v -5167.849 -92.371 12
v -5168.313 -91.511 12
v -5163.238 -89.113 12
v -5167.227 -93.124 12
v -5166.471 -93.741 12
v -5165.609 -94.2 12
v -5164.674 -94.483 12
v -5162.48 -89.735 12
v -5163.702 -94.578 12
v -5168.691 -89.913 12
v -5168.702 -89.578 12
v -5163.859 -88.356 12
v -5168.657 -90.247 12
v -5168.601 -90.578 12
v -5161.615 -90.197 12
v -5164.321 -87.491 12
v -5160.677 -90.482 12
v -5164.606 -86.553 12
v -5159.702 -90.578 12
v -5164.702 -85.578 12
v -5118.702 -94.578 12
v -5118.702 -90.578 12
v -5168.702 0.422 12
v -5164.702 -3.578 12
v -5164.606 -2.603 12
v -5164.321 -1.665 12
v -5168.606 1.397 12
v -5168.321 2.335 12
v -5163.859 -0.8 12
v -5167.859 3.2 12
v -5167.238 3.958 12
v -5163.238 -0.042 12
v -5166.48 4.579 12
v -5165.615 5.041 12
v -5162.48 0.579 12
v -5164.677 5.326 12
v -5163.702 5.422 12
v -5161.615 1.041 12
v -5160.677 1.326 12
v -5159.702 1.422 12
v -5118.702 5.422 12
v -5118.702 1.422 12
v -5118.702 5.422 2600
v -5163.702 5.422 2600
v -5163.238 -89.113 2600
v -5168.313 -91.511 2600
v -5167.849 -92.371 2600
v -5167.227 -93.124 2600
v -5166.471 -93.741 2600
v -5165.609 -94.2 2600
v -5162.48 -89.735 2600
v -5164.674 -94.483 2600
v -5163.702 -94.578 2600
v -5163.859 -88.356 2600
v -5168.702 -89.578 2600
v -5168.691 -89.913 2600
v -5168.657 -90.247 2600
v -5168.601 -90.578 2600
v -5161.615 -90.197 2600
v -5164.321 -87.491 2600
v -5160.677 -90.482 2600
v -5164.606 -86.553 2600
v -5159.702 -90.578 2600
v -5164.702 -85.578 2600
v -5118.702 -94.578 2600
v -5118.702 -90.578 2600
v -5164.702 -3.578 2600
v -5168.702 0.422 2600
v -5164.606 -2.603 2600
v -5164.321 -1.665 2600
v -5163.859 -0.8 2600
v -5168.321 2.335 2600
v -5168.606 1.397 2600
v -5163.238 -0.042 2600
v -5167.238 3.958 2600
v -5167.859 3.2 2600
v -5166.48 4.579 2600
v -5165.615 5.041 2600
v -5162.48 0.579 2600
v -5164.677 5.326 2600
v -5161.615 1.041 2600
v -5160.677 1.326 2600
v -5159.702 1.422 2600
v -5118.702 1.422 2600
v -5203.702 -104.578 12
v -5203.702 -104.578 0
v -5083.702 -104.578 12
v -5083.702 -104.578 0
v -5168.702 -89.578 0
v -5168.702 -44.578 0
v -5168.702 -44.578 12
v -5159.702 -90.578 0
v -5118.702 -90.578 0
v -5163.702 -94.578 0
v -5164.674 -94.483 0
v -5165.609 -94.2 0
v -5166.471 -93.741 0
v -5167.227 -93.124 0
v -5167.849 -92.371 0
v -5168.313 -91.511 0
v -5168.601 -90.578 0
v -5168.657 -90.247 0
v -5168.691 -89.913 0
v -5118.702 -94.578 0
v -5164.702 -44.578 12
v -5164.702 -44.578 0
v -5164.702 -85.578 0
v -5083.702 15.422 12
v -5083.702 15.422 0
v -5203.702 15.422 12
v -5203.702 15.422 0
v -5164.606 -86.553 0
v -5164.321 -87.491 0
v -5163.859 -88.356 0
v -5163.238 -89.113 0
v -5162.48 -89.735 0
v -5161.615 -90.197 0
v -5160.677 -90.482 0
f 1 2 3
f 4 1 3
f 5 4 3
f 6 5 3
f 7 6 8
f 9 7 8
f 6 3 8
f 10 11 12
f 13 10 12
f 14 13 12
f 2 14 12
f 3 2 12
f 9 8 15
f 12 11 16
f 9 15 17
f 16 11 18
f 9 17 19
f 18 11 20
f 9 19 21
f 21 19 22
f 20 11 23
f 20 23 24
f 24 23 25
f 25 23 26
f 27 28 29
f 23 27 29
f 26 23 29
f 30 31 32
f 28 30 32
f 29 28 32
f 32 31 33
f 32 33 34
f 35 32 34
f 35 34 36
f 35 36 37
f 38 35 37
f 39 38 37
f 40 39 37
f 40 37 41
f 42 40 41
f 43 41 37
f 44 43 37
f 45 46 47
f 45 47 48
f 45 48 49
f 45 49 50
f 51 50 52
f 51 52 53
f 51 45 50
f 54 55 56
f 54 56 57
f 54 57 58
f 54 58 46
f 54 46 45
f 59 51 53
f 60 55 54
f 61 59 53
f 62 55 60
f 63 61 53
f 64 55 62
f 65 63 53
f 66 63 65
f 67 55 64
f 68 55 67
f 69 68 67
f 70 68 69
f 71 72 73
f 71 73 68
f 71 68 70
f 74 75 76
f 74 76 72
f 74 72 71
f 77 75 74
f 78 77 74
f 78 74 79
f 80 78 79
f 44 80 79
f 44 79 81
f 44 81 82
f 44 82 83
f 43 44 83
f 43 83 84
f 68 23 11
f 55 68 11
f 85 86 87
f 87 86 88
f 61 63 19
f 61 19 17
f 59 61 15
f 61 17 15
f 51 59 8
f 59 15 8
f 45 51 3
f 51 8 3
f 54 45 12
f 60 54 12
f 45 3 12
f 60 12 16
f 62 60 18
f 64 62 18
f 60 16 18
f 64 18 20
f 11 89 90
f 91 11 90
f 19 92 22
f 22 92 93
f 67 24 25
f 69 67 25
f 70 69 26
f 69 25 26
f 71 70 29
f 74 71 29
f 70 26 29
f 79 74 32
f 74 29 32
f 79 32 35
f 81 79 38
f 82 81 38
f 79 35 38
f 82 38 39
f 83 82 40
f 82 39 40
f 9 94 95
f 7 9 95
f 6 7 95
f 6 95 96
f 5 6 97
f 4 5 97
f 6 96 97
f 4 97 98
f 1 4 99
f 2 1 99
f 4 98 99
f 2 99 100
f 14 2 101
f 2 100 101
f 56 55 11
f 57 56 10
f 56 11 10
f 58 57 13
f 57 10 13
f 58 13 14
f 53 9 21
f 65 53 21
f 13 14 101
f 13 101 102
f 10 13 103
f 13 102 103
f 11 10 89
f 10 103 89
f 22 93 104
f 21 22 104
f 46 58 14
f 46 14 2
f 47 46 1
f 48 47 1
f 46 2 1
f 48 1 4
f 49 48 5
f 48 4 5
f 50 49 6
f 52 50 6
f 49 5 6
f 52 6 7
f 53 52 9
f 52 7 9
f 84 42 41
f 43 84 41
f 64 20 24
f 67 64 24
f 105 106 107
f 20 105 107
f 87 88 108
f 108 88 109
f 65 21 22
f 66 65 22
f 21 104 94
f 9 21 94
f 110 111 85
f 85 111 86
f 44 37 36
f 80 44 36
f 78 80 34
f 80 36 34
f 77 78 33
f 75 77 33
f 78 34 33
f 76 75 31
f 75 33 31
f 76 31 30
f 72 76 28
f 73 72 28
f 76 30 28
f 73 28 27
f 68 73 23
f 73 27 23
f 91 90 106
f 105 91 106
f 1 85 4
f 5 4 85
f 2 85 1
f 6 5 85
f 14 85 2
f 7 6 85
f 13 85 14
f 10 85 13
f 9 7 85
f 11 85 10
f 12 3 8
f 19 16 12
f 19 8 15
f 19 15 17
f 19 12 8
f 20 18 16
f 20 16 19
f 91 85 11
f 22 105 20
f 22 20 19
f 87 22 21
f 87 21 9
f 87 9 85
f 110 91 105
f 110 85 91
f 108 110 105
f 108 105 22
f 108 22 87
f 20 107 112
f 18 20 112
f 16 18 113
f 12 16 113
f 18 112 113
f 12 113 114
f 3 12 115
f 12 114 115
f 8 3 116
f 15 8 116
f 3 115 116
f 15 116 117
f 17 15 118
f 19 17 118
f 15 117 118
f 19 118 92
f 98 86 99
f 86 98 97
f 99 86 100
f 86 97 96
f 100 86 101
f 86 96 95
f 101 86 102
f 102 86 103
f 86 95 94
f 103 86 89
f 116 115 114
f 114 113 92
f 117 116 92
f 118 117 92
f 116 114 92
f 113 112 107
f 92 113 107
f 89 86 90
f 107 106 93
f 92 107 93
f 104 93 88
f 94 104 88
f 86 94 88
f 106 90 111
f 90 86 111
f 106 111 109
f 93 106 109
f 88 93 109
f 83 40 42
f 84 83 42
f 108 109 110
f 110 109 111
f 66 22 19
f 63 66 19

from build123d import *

# Parameters (mm, degrees)
F1_DEPTH = 2600
F2_DEPTH = 12
F3_DEPTH = 12


with BuildPart() as f1:
    # F0 (on Top) → F1 (new body)
    with BuildSketch(Plane.XY):
        with BuildLine():
            Line((-5168.702047, 0.422041), (-5168.702047, -44.577959))
            Line((-5168.702047, -44.577959), (-5164.702047, -44.577959))
            Line((-5164.702047, -44.577959), (-5164.702047, -3.577959))
            ThreePointArc((-5164.702047, -3.577959), (-5163.237581, -0.042425), (-5159.702047, 1.422041))
            Line((-5159.702047, 1.422041), (-5143.702047, 1.422041))
            Line((-5143.702047, 1.422041), (-5118.702047, 1.422041))
            Line((-5118.702047, 1.422041), (-5118.702047, 5.422041))
            Line((-5118.702047, 5.422041), (-5143.702047, 5.422041))
            Line((-5143.702047, 5.422041), (-5163.702047, 5.422041))
            ThreePointArc((-5163.702047, 5.422041), (-5167.237581, 3.957575), (-5168.702047, 0.422041))
        make_face()
        with BuildLine():
            Line((-5164.702047, -44.577959), (-5168.702047, -44.577959))
            Line((-5168.702047, -44.577959), (-5168.702047, -89.577959))
            ThreePointArc((-5168.702047, -89.577959), (-5168.676728, -90.080503), (-5168.601027, -90.577959))
            ThreePointArc((-5168.601027, -90.577959), (-5166.864325, -93.450942), (-5163.702047, -94.577959))
            Line((-5163.702047, -94.577959), (-5143.702047, -94.577959))
            Line((-5143.702047, -94.577959), (-5118.702047, -94.577959))
            Line((-5118.702047, -94.577959), (-5118.702047, -90.577959))
            Line((-5118.702047, -90.577959), (-5143.702047, -90.577959))
            Line((-5143.702047, -90.577959), (-5159.702047, -90.577959))
            ThreePointArc((-5159.702047, -90.577959), (-5163.237581, -89.113492), (-5164.702047, -85.577959))
            Line((-5164.702047, -85.577959), (-5164.702047, -44.577959))
        make_face()
    extrude(amount=F1_DEPTH)

    # F0 (on Top) → F2 (cut)
    with BuildSketch(Plane.XY):
        with BuildLine():
            Line((-5164.702047, -44.577959), (-5168.702047, -44.577959))
            Line((-5168.702047, -44.577959), (-5168.702047, -89.577959))
            ThreePointArc((-5168.702047, -89.577959), (-5168.676728, -90.080503), (-5168.601027, -90.577959))
            ThreePointArc((-5168.601027, -90.577959), (-5166.864325, -93.450942), (-5163.702047, -94.577959))
            Line((-5163.702047, -94.577959), (-5143.702047, -94.577959))
            Line((-5143.702047, -94.577959), (-5118.702047, -94.577959))
            Line((-5118.702047, -94.577959), (-5118.702047, -90.577959))
            Line((-5118.702047, -90.577959), (-5143.702047, -90.577959))
            Line((-5143.702047, -90.577959), (-5159.702047, -90.577959))
            ThreePointArc((-5159.702047, -90.577959), (-5163.237581, -89.113492), (-5164.702047, -85.577959))
            Line((-5164.702047, -85.577959), (-5164.702047, -44.577959))
        make_face()
        with BuildLine():
            Line((-5168.702047, 0.422041), (-5168.702047, -44.577959))
            Line((-5168.702047, -44.577959), (-5164.702047, -44.577959))
            Line((-5164.702047, -44.577959), (-5164.702047, -3.577959))
            ThreePointArc((-5164.702047, -3.577959), (-5163.237581, -0.042425), (-5159.702047, 1.422041))
            Line((-5159.702047, 1.422041), (-5143.702047, 1.422041))
            Line((-5143.702047, 1.422041), (-5118.702047, 1.422041))
            Line((-5118.702047, 1.422041), (-5118.702047, 5.422041))
            Line((-5118.702047, 5.422041), (-5143.702047, 5.422041))
            Line((-5143.702047, 5.422041), (-5163.702047, 5.422041))
            ThreePointArc((-5163.702047, 5.422041), (-5167.237581, 3.957575), (-5168.702047, 0.422041))
        make_face()
    extrude(amount=F2_DEPTH, mode=Mode.SUBTRACT)


with BuildPart() as f3:
    # F0 (on Top) → F3 (new body)
    with BuildSketch(Plane.XY):
        with BuildLine():
            Line((-5168.702047, -44.577959), (-5203.702047, -44.577959))
            Line((-5203.702047, -44.577959), (-5203.702047, -104.577959))
            Line((-5203.702047, -104.577959), (-5083.702047, -104.577959))
            Line((-5083.702047, -104.577959), (-5083.702047, -44.577959))
            Line((-5083.702047, -44.577959), (-5164.702047, -44.577959))
            Line((-5164.702047, -44.577959), (-5164.702047, -85.577959))
            ThreePointArc((-5164.702047, -85.577959), (-5163.237581, -89.113492), (-5159.702047, -90.577959))
            Line((-5159.702047, -90.577959), (-5143.702047, -90.577959))
            Line((-5143.702047, -90.577959), (-5118.702047, -90.577959))
            Line((-5118.702047, -90.577959), (-5118.702047, -94.577959))
            Line((-5118.702047, -94.577959), (-5143.702047, -94.577959))
            Line((-5143.702047, -94.577959), (-5163.702047, -94.577959))
            ThreePointArc((-5163.702047, -94.577959), (-5166.864325, -93.450942), (-5168.601027, -90.577959))
            ThreePointArc((-5168.601027, -90.577959), (-5168.676728, -90.080503), (-5168.702047, -89.577959))
            Line((-5168.702047, -89.577959), (-5168.702047, -44.577959))
        make_face()
        with BuildLine():
            Line((-5168.702047, 0.422041), (-5168.702047, -44.577959))
            Line((-5168.702047, -44.577959), (-5164.702047, -44.577959))
            Line((-5164.702047, -44.577959), (-5164.702047, -3.577959))
            ThreePointArc((-5164.702047, -3.577959), (-5163.237581, -0.042425), (-5159.702047, 1.422041))
            Line((-5159.702047, 1.422041), (-5143.702047, 1.422041))
            Line((-5143.702047, 1.422041), (-5118.702047, 1.422041))
            Line((-5118.702047, 1.422041), (-5118.702047, 5.422041))
            Line((-5118.702047, 5.422041), (-5143.702047, 5.422041))
            Line((-5143.702047, 5.422041), (-5163.702047, 5.422041))
            ThreePointArc((-5163.702047, 5.422041), (-5167.237581, 3.957575), (-5168.702047, 0.422041))
        make_face()
        with BuildLine():
            Line((-5083.702047, 15.422041), (-5203.702047, 15.422041))
            Line((-5203.702047, 15.422041), (-5203.702047, -44.577959))
            Line((-5203.702047, -44.577959), (-5168.702047, -44.577959))
            Line((-5168.702047, -44.577959), (-5168.702047, 0.422041))
            ThreePointArc((-5168.702047, 0.422041), (-5167.237581, 3.957575), (-5163.702047, 5.422041))
            Line((-5163.702047, 5.422041), (-5143.702047, 5.422041))
            Line((-5143.702047, 5.422041), (-5118.702047, 5.422041))
            Line((-5118.702047, 5.422041), (-5118.702047, 1.422041))
            Line((-5118.702047, 1.422041), (-5143.702047, 1.422041))
            Line((-5143.702047, 1.422041), (-5159.702047, 1.422041))
            ThreePointArc((-5159.702047, 1.422041), (-5163.237581, -0.042425), (-5164.702047, -3.577959))
            Line((-5164.702047, -3.577959), (-5164.702047, -44.577959))
            Line((-5164.702047, -44.577959), (-5083.702047, -44.577959))
            Line((-5083.702047, -44.577959), (-5083.702047, 15.422041))
        make_face()
    extrude(amount=F3_DEPTH)


solid = Compound([f1.part, f3.part])
